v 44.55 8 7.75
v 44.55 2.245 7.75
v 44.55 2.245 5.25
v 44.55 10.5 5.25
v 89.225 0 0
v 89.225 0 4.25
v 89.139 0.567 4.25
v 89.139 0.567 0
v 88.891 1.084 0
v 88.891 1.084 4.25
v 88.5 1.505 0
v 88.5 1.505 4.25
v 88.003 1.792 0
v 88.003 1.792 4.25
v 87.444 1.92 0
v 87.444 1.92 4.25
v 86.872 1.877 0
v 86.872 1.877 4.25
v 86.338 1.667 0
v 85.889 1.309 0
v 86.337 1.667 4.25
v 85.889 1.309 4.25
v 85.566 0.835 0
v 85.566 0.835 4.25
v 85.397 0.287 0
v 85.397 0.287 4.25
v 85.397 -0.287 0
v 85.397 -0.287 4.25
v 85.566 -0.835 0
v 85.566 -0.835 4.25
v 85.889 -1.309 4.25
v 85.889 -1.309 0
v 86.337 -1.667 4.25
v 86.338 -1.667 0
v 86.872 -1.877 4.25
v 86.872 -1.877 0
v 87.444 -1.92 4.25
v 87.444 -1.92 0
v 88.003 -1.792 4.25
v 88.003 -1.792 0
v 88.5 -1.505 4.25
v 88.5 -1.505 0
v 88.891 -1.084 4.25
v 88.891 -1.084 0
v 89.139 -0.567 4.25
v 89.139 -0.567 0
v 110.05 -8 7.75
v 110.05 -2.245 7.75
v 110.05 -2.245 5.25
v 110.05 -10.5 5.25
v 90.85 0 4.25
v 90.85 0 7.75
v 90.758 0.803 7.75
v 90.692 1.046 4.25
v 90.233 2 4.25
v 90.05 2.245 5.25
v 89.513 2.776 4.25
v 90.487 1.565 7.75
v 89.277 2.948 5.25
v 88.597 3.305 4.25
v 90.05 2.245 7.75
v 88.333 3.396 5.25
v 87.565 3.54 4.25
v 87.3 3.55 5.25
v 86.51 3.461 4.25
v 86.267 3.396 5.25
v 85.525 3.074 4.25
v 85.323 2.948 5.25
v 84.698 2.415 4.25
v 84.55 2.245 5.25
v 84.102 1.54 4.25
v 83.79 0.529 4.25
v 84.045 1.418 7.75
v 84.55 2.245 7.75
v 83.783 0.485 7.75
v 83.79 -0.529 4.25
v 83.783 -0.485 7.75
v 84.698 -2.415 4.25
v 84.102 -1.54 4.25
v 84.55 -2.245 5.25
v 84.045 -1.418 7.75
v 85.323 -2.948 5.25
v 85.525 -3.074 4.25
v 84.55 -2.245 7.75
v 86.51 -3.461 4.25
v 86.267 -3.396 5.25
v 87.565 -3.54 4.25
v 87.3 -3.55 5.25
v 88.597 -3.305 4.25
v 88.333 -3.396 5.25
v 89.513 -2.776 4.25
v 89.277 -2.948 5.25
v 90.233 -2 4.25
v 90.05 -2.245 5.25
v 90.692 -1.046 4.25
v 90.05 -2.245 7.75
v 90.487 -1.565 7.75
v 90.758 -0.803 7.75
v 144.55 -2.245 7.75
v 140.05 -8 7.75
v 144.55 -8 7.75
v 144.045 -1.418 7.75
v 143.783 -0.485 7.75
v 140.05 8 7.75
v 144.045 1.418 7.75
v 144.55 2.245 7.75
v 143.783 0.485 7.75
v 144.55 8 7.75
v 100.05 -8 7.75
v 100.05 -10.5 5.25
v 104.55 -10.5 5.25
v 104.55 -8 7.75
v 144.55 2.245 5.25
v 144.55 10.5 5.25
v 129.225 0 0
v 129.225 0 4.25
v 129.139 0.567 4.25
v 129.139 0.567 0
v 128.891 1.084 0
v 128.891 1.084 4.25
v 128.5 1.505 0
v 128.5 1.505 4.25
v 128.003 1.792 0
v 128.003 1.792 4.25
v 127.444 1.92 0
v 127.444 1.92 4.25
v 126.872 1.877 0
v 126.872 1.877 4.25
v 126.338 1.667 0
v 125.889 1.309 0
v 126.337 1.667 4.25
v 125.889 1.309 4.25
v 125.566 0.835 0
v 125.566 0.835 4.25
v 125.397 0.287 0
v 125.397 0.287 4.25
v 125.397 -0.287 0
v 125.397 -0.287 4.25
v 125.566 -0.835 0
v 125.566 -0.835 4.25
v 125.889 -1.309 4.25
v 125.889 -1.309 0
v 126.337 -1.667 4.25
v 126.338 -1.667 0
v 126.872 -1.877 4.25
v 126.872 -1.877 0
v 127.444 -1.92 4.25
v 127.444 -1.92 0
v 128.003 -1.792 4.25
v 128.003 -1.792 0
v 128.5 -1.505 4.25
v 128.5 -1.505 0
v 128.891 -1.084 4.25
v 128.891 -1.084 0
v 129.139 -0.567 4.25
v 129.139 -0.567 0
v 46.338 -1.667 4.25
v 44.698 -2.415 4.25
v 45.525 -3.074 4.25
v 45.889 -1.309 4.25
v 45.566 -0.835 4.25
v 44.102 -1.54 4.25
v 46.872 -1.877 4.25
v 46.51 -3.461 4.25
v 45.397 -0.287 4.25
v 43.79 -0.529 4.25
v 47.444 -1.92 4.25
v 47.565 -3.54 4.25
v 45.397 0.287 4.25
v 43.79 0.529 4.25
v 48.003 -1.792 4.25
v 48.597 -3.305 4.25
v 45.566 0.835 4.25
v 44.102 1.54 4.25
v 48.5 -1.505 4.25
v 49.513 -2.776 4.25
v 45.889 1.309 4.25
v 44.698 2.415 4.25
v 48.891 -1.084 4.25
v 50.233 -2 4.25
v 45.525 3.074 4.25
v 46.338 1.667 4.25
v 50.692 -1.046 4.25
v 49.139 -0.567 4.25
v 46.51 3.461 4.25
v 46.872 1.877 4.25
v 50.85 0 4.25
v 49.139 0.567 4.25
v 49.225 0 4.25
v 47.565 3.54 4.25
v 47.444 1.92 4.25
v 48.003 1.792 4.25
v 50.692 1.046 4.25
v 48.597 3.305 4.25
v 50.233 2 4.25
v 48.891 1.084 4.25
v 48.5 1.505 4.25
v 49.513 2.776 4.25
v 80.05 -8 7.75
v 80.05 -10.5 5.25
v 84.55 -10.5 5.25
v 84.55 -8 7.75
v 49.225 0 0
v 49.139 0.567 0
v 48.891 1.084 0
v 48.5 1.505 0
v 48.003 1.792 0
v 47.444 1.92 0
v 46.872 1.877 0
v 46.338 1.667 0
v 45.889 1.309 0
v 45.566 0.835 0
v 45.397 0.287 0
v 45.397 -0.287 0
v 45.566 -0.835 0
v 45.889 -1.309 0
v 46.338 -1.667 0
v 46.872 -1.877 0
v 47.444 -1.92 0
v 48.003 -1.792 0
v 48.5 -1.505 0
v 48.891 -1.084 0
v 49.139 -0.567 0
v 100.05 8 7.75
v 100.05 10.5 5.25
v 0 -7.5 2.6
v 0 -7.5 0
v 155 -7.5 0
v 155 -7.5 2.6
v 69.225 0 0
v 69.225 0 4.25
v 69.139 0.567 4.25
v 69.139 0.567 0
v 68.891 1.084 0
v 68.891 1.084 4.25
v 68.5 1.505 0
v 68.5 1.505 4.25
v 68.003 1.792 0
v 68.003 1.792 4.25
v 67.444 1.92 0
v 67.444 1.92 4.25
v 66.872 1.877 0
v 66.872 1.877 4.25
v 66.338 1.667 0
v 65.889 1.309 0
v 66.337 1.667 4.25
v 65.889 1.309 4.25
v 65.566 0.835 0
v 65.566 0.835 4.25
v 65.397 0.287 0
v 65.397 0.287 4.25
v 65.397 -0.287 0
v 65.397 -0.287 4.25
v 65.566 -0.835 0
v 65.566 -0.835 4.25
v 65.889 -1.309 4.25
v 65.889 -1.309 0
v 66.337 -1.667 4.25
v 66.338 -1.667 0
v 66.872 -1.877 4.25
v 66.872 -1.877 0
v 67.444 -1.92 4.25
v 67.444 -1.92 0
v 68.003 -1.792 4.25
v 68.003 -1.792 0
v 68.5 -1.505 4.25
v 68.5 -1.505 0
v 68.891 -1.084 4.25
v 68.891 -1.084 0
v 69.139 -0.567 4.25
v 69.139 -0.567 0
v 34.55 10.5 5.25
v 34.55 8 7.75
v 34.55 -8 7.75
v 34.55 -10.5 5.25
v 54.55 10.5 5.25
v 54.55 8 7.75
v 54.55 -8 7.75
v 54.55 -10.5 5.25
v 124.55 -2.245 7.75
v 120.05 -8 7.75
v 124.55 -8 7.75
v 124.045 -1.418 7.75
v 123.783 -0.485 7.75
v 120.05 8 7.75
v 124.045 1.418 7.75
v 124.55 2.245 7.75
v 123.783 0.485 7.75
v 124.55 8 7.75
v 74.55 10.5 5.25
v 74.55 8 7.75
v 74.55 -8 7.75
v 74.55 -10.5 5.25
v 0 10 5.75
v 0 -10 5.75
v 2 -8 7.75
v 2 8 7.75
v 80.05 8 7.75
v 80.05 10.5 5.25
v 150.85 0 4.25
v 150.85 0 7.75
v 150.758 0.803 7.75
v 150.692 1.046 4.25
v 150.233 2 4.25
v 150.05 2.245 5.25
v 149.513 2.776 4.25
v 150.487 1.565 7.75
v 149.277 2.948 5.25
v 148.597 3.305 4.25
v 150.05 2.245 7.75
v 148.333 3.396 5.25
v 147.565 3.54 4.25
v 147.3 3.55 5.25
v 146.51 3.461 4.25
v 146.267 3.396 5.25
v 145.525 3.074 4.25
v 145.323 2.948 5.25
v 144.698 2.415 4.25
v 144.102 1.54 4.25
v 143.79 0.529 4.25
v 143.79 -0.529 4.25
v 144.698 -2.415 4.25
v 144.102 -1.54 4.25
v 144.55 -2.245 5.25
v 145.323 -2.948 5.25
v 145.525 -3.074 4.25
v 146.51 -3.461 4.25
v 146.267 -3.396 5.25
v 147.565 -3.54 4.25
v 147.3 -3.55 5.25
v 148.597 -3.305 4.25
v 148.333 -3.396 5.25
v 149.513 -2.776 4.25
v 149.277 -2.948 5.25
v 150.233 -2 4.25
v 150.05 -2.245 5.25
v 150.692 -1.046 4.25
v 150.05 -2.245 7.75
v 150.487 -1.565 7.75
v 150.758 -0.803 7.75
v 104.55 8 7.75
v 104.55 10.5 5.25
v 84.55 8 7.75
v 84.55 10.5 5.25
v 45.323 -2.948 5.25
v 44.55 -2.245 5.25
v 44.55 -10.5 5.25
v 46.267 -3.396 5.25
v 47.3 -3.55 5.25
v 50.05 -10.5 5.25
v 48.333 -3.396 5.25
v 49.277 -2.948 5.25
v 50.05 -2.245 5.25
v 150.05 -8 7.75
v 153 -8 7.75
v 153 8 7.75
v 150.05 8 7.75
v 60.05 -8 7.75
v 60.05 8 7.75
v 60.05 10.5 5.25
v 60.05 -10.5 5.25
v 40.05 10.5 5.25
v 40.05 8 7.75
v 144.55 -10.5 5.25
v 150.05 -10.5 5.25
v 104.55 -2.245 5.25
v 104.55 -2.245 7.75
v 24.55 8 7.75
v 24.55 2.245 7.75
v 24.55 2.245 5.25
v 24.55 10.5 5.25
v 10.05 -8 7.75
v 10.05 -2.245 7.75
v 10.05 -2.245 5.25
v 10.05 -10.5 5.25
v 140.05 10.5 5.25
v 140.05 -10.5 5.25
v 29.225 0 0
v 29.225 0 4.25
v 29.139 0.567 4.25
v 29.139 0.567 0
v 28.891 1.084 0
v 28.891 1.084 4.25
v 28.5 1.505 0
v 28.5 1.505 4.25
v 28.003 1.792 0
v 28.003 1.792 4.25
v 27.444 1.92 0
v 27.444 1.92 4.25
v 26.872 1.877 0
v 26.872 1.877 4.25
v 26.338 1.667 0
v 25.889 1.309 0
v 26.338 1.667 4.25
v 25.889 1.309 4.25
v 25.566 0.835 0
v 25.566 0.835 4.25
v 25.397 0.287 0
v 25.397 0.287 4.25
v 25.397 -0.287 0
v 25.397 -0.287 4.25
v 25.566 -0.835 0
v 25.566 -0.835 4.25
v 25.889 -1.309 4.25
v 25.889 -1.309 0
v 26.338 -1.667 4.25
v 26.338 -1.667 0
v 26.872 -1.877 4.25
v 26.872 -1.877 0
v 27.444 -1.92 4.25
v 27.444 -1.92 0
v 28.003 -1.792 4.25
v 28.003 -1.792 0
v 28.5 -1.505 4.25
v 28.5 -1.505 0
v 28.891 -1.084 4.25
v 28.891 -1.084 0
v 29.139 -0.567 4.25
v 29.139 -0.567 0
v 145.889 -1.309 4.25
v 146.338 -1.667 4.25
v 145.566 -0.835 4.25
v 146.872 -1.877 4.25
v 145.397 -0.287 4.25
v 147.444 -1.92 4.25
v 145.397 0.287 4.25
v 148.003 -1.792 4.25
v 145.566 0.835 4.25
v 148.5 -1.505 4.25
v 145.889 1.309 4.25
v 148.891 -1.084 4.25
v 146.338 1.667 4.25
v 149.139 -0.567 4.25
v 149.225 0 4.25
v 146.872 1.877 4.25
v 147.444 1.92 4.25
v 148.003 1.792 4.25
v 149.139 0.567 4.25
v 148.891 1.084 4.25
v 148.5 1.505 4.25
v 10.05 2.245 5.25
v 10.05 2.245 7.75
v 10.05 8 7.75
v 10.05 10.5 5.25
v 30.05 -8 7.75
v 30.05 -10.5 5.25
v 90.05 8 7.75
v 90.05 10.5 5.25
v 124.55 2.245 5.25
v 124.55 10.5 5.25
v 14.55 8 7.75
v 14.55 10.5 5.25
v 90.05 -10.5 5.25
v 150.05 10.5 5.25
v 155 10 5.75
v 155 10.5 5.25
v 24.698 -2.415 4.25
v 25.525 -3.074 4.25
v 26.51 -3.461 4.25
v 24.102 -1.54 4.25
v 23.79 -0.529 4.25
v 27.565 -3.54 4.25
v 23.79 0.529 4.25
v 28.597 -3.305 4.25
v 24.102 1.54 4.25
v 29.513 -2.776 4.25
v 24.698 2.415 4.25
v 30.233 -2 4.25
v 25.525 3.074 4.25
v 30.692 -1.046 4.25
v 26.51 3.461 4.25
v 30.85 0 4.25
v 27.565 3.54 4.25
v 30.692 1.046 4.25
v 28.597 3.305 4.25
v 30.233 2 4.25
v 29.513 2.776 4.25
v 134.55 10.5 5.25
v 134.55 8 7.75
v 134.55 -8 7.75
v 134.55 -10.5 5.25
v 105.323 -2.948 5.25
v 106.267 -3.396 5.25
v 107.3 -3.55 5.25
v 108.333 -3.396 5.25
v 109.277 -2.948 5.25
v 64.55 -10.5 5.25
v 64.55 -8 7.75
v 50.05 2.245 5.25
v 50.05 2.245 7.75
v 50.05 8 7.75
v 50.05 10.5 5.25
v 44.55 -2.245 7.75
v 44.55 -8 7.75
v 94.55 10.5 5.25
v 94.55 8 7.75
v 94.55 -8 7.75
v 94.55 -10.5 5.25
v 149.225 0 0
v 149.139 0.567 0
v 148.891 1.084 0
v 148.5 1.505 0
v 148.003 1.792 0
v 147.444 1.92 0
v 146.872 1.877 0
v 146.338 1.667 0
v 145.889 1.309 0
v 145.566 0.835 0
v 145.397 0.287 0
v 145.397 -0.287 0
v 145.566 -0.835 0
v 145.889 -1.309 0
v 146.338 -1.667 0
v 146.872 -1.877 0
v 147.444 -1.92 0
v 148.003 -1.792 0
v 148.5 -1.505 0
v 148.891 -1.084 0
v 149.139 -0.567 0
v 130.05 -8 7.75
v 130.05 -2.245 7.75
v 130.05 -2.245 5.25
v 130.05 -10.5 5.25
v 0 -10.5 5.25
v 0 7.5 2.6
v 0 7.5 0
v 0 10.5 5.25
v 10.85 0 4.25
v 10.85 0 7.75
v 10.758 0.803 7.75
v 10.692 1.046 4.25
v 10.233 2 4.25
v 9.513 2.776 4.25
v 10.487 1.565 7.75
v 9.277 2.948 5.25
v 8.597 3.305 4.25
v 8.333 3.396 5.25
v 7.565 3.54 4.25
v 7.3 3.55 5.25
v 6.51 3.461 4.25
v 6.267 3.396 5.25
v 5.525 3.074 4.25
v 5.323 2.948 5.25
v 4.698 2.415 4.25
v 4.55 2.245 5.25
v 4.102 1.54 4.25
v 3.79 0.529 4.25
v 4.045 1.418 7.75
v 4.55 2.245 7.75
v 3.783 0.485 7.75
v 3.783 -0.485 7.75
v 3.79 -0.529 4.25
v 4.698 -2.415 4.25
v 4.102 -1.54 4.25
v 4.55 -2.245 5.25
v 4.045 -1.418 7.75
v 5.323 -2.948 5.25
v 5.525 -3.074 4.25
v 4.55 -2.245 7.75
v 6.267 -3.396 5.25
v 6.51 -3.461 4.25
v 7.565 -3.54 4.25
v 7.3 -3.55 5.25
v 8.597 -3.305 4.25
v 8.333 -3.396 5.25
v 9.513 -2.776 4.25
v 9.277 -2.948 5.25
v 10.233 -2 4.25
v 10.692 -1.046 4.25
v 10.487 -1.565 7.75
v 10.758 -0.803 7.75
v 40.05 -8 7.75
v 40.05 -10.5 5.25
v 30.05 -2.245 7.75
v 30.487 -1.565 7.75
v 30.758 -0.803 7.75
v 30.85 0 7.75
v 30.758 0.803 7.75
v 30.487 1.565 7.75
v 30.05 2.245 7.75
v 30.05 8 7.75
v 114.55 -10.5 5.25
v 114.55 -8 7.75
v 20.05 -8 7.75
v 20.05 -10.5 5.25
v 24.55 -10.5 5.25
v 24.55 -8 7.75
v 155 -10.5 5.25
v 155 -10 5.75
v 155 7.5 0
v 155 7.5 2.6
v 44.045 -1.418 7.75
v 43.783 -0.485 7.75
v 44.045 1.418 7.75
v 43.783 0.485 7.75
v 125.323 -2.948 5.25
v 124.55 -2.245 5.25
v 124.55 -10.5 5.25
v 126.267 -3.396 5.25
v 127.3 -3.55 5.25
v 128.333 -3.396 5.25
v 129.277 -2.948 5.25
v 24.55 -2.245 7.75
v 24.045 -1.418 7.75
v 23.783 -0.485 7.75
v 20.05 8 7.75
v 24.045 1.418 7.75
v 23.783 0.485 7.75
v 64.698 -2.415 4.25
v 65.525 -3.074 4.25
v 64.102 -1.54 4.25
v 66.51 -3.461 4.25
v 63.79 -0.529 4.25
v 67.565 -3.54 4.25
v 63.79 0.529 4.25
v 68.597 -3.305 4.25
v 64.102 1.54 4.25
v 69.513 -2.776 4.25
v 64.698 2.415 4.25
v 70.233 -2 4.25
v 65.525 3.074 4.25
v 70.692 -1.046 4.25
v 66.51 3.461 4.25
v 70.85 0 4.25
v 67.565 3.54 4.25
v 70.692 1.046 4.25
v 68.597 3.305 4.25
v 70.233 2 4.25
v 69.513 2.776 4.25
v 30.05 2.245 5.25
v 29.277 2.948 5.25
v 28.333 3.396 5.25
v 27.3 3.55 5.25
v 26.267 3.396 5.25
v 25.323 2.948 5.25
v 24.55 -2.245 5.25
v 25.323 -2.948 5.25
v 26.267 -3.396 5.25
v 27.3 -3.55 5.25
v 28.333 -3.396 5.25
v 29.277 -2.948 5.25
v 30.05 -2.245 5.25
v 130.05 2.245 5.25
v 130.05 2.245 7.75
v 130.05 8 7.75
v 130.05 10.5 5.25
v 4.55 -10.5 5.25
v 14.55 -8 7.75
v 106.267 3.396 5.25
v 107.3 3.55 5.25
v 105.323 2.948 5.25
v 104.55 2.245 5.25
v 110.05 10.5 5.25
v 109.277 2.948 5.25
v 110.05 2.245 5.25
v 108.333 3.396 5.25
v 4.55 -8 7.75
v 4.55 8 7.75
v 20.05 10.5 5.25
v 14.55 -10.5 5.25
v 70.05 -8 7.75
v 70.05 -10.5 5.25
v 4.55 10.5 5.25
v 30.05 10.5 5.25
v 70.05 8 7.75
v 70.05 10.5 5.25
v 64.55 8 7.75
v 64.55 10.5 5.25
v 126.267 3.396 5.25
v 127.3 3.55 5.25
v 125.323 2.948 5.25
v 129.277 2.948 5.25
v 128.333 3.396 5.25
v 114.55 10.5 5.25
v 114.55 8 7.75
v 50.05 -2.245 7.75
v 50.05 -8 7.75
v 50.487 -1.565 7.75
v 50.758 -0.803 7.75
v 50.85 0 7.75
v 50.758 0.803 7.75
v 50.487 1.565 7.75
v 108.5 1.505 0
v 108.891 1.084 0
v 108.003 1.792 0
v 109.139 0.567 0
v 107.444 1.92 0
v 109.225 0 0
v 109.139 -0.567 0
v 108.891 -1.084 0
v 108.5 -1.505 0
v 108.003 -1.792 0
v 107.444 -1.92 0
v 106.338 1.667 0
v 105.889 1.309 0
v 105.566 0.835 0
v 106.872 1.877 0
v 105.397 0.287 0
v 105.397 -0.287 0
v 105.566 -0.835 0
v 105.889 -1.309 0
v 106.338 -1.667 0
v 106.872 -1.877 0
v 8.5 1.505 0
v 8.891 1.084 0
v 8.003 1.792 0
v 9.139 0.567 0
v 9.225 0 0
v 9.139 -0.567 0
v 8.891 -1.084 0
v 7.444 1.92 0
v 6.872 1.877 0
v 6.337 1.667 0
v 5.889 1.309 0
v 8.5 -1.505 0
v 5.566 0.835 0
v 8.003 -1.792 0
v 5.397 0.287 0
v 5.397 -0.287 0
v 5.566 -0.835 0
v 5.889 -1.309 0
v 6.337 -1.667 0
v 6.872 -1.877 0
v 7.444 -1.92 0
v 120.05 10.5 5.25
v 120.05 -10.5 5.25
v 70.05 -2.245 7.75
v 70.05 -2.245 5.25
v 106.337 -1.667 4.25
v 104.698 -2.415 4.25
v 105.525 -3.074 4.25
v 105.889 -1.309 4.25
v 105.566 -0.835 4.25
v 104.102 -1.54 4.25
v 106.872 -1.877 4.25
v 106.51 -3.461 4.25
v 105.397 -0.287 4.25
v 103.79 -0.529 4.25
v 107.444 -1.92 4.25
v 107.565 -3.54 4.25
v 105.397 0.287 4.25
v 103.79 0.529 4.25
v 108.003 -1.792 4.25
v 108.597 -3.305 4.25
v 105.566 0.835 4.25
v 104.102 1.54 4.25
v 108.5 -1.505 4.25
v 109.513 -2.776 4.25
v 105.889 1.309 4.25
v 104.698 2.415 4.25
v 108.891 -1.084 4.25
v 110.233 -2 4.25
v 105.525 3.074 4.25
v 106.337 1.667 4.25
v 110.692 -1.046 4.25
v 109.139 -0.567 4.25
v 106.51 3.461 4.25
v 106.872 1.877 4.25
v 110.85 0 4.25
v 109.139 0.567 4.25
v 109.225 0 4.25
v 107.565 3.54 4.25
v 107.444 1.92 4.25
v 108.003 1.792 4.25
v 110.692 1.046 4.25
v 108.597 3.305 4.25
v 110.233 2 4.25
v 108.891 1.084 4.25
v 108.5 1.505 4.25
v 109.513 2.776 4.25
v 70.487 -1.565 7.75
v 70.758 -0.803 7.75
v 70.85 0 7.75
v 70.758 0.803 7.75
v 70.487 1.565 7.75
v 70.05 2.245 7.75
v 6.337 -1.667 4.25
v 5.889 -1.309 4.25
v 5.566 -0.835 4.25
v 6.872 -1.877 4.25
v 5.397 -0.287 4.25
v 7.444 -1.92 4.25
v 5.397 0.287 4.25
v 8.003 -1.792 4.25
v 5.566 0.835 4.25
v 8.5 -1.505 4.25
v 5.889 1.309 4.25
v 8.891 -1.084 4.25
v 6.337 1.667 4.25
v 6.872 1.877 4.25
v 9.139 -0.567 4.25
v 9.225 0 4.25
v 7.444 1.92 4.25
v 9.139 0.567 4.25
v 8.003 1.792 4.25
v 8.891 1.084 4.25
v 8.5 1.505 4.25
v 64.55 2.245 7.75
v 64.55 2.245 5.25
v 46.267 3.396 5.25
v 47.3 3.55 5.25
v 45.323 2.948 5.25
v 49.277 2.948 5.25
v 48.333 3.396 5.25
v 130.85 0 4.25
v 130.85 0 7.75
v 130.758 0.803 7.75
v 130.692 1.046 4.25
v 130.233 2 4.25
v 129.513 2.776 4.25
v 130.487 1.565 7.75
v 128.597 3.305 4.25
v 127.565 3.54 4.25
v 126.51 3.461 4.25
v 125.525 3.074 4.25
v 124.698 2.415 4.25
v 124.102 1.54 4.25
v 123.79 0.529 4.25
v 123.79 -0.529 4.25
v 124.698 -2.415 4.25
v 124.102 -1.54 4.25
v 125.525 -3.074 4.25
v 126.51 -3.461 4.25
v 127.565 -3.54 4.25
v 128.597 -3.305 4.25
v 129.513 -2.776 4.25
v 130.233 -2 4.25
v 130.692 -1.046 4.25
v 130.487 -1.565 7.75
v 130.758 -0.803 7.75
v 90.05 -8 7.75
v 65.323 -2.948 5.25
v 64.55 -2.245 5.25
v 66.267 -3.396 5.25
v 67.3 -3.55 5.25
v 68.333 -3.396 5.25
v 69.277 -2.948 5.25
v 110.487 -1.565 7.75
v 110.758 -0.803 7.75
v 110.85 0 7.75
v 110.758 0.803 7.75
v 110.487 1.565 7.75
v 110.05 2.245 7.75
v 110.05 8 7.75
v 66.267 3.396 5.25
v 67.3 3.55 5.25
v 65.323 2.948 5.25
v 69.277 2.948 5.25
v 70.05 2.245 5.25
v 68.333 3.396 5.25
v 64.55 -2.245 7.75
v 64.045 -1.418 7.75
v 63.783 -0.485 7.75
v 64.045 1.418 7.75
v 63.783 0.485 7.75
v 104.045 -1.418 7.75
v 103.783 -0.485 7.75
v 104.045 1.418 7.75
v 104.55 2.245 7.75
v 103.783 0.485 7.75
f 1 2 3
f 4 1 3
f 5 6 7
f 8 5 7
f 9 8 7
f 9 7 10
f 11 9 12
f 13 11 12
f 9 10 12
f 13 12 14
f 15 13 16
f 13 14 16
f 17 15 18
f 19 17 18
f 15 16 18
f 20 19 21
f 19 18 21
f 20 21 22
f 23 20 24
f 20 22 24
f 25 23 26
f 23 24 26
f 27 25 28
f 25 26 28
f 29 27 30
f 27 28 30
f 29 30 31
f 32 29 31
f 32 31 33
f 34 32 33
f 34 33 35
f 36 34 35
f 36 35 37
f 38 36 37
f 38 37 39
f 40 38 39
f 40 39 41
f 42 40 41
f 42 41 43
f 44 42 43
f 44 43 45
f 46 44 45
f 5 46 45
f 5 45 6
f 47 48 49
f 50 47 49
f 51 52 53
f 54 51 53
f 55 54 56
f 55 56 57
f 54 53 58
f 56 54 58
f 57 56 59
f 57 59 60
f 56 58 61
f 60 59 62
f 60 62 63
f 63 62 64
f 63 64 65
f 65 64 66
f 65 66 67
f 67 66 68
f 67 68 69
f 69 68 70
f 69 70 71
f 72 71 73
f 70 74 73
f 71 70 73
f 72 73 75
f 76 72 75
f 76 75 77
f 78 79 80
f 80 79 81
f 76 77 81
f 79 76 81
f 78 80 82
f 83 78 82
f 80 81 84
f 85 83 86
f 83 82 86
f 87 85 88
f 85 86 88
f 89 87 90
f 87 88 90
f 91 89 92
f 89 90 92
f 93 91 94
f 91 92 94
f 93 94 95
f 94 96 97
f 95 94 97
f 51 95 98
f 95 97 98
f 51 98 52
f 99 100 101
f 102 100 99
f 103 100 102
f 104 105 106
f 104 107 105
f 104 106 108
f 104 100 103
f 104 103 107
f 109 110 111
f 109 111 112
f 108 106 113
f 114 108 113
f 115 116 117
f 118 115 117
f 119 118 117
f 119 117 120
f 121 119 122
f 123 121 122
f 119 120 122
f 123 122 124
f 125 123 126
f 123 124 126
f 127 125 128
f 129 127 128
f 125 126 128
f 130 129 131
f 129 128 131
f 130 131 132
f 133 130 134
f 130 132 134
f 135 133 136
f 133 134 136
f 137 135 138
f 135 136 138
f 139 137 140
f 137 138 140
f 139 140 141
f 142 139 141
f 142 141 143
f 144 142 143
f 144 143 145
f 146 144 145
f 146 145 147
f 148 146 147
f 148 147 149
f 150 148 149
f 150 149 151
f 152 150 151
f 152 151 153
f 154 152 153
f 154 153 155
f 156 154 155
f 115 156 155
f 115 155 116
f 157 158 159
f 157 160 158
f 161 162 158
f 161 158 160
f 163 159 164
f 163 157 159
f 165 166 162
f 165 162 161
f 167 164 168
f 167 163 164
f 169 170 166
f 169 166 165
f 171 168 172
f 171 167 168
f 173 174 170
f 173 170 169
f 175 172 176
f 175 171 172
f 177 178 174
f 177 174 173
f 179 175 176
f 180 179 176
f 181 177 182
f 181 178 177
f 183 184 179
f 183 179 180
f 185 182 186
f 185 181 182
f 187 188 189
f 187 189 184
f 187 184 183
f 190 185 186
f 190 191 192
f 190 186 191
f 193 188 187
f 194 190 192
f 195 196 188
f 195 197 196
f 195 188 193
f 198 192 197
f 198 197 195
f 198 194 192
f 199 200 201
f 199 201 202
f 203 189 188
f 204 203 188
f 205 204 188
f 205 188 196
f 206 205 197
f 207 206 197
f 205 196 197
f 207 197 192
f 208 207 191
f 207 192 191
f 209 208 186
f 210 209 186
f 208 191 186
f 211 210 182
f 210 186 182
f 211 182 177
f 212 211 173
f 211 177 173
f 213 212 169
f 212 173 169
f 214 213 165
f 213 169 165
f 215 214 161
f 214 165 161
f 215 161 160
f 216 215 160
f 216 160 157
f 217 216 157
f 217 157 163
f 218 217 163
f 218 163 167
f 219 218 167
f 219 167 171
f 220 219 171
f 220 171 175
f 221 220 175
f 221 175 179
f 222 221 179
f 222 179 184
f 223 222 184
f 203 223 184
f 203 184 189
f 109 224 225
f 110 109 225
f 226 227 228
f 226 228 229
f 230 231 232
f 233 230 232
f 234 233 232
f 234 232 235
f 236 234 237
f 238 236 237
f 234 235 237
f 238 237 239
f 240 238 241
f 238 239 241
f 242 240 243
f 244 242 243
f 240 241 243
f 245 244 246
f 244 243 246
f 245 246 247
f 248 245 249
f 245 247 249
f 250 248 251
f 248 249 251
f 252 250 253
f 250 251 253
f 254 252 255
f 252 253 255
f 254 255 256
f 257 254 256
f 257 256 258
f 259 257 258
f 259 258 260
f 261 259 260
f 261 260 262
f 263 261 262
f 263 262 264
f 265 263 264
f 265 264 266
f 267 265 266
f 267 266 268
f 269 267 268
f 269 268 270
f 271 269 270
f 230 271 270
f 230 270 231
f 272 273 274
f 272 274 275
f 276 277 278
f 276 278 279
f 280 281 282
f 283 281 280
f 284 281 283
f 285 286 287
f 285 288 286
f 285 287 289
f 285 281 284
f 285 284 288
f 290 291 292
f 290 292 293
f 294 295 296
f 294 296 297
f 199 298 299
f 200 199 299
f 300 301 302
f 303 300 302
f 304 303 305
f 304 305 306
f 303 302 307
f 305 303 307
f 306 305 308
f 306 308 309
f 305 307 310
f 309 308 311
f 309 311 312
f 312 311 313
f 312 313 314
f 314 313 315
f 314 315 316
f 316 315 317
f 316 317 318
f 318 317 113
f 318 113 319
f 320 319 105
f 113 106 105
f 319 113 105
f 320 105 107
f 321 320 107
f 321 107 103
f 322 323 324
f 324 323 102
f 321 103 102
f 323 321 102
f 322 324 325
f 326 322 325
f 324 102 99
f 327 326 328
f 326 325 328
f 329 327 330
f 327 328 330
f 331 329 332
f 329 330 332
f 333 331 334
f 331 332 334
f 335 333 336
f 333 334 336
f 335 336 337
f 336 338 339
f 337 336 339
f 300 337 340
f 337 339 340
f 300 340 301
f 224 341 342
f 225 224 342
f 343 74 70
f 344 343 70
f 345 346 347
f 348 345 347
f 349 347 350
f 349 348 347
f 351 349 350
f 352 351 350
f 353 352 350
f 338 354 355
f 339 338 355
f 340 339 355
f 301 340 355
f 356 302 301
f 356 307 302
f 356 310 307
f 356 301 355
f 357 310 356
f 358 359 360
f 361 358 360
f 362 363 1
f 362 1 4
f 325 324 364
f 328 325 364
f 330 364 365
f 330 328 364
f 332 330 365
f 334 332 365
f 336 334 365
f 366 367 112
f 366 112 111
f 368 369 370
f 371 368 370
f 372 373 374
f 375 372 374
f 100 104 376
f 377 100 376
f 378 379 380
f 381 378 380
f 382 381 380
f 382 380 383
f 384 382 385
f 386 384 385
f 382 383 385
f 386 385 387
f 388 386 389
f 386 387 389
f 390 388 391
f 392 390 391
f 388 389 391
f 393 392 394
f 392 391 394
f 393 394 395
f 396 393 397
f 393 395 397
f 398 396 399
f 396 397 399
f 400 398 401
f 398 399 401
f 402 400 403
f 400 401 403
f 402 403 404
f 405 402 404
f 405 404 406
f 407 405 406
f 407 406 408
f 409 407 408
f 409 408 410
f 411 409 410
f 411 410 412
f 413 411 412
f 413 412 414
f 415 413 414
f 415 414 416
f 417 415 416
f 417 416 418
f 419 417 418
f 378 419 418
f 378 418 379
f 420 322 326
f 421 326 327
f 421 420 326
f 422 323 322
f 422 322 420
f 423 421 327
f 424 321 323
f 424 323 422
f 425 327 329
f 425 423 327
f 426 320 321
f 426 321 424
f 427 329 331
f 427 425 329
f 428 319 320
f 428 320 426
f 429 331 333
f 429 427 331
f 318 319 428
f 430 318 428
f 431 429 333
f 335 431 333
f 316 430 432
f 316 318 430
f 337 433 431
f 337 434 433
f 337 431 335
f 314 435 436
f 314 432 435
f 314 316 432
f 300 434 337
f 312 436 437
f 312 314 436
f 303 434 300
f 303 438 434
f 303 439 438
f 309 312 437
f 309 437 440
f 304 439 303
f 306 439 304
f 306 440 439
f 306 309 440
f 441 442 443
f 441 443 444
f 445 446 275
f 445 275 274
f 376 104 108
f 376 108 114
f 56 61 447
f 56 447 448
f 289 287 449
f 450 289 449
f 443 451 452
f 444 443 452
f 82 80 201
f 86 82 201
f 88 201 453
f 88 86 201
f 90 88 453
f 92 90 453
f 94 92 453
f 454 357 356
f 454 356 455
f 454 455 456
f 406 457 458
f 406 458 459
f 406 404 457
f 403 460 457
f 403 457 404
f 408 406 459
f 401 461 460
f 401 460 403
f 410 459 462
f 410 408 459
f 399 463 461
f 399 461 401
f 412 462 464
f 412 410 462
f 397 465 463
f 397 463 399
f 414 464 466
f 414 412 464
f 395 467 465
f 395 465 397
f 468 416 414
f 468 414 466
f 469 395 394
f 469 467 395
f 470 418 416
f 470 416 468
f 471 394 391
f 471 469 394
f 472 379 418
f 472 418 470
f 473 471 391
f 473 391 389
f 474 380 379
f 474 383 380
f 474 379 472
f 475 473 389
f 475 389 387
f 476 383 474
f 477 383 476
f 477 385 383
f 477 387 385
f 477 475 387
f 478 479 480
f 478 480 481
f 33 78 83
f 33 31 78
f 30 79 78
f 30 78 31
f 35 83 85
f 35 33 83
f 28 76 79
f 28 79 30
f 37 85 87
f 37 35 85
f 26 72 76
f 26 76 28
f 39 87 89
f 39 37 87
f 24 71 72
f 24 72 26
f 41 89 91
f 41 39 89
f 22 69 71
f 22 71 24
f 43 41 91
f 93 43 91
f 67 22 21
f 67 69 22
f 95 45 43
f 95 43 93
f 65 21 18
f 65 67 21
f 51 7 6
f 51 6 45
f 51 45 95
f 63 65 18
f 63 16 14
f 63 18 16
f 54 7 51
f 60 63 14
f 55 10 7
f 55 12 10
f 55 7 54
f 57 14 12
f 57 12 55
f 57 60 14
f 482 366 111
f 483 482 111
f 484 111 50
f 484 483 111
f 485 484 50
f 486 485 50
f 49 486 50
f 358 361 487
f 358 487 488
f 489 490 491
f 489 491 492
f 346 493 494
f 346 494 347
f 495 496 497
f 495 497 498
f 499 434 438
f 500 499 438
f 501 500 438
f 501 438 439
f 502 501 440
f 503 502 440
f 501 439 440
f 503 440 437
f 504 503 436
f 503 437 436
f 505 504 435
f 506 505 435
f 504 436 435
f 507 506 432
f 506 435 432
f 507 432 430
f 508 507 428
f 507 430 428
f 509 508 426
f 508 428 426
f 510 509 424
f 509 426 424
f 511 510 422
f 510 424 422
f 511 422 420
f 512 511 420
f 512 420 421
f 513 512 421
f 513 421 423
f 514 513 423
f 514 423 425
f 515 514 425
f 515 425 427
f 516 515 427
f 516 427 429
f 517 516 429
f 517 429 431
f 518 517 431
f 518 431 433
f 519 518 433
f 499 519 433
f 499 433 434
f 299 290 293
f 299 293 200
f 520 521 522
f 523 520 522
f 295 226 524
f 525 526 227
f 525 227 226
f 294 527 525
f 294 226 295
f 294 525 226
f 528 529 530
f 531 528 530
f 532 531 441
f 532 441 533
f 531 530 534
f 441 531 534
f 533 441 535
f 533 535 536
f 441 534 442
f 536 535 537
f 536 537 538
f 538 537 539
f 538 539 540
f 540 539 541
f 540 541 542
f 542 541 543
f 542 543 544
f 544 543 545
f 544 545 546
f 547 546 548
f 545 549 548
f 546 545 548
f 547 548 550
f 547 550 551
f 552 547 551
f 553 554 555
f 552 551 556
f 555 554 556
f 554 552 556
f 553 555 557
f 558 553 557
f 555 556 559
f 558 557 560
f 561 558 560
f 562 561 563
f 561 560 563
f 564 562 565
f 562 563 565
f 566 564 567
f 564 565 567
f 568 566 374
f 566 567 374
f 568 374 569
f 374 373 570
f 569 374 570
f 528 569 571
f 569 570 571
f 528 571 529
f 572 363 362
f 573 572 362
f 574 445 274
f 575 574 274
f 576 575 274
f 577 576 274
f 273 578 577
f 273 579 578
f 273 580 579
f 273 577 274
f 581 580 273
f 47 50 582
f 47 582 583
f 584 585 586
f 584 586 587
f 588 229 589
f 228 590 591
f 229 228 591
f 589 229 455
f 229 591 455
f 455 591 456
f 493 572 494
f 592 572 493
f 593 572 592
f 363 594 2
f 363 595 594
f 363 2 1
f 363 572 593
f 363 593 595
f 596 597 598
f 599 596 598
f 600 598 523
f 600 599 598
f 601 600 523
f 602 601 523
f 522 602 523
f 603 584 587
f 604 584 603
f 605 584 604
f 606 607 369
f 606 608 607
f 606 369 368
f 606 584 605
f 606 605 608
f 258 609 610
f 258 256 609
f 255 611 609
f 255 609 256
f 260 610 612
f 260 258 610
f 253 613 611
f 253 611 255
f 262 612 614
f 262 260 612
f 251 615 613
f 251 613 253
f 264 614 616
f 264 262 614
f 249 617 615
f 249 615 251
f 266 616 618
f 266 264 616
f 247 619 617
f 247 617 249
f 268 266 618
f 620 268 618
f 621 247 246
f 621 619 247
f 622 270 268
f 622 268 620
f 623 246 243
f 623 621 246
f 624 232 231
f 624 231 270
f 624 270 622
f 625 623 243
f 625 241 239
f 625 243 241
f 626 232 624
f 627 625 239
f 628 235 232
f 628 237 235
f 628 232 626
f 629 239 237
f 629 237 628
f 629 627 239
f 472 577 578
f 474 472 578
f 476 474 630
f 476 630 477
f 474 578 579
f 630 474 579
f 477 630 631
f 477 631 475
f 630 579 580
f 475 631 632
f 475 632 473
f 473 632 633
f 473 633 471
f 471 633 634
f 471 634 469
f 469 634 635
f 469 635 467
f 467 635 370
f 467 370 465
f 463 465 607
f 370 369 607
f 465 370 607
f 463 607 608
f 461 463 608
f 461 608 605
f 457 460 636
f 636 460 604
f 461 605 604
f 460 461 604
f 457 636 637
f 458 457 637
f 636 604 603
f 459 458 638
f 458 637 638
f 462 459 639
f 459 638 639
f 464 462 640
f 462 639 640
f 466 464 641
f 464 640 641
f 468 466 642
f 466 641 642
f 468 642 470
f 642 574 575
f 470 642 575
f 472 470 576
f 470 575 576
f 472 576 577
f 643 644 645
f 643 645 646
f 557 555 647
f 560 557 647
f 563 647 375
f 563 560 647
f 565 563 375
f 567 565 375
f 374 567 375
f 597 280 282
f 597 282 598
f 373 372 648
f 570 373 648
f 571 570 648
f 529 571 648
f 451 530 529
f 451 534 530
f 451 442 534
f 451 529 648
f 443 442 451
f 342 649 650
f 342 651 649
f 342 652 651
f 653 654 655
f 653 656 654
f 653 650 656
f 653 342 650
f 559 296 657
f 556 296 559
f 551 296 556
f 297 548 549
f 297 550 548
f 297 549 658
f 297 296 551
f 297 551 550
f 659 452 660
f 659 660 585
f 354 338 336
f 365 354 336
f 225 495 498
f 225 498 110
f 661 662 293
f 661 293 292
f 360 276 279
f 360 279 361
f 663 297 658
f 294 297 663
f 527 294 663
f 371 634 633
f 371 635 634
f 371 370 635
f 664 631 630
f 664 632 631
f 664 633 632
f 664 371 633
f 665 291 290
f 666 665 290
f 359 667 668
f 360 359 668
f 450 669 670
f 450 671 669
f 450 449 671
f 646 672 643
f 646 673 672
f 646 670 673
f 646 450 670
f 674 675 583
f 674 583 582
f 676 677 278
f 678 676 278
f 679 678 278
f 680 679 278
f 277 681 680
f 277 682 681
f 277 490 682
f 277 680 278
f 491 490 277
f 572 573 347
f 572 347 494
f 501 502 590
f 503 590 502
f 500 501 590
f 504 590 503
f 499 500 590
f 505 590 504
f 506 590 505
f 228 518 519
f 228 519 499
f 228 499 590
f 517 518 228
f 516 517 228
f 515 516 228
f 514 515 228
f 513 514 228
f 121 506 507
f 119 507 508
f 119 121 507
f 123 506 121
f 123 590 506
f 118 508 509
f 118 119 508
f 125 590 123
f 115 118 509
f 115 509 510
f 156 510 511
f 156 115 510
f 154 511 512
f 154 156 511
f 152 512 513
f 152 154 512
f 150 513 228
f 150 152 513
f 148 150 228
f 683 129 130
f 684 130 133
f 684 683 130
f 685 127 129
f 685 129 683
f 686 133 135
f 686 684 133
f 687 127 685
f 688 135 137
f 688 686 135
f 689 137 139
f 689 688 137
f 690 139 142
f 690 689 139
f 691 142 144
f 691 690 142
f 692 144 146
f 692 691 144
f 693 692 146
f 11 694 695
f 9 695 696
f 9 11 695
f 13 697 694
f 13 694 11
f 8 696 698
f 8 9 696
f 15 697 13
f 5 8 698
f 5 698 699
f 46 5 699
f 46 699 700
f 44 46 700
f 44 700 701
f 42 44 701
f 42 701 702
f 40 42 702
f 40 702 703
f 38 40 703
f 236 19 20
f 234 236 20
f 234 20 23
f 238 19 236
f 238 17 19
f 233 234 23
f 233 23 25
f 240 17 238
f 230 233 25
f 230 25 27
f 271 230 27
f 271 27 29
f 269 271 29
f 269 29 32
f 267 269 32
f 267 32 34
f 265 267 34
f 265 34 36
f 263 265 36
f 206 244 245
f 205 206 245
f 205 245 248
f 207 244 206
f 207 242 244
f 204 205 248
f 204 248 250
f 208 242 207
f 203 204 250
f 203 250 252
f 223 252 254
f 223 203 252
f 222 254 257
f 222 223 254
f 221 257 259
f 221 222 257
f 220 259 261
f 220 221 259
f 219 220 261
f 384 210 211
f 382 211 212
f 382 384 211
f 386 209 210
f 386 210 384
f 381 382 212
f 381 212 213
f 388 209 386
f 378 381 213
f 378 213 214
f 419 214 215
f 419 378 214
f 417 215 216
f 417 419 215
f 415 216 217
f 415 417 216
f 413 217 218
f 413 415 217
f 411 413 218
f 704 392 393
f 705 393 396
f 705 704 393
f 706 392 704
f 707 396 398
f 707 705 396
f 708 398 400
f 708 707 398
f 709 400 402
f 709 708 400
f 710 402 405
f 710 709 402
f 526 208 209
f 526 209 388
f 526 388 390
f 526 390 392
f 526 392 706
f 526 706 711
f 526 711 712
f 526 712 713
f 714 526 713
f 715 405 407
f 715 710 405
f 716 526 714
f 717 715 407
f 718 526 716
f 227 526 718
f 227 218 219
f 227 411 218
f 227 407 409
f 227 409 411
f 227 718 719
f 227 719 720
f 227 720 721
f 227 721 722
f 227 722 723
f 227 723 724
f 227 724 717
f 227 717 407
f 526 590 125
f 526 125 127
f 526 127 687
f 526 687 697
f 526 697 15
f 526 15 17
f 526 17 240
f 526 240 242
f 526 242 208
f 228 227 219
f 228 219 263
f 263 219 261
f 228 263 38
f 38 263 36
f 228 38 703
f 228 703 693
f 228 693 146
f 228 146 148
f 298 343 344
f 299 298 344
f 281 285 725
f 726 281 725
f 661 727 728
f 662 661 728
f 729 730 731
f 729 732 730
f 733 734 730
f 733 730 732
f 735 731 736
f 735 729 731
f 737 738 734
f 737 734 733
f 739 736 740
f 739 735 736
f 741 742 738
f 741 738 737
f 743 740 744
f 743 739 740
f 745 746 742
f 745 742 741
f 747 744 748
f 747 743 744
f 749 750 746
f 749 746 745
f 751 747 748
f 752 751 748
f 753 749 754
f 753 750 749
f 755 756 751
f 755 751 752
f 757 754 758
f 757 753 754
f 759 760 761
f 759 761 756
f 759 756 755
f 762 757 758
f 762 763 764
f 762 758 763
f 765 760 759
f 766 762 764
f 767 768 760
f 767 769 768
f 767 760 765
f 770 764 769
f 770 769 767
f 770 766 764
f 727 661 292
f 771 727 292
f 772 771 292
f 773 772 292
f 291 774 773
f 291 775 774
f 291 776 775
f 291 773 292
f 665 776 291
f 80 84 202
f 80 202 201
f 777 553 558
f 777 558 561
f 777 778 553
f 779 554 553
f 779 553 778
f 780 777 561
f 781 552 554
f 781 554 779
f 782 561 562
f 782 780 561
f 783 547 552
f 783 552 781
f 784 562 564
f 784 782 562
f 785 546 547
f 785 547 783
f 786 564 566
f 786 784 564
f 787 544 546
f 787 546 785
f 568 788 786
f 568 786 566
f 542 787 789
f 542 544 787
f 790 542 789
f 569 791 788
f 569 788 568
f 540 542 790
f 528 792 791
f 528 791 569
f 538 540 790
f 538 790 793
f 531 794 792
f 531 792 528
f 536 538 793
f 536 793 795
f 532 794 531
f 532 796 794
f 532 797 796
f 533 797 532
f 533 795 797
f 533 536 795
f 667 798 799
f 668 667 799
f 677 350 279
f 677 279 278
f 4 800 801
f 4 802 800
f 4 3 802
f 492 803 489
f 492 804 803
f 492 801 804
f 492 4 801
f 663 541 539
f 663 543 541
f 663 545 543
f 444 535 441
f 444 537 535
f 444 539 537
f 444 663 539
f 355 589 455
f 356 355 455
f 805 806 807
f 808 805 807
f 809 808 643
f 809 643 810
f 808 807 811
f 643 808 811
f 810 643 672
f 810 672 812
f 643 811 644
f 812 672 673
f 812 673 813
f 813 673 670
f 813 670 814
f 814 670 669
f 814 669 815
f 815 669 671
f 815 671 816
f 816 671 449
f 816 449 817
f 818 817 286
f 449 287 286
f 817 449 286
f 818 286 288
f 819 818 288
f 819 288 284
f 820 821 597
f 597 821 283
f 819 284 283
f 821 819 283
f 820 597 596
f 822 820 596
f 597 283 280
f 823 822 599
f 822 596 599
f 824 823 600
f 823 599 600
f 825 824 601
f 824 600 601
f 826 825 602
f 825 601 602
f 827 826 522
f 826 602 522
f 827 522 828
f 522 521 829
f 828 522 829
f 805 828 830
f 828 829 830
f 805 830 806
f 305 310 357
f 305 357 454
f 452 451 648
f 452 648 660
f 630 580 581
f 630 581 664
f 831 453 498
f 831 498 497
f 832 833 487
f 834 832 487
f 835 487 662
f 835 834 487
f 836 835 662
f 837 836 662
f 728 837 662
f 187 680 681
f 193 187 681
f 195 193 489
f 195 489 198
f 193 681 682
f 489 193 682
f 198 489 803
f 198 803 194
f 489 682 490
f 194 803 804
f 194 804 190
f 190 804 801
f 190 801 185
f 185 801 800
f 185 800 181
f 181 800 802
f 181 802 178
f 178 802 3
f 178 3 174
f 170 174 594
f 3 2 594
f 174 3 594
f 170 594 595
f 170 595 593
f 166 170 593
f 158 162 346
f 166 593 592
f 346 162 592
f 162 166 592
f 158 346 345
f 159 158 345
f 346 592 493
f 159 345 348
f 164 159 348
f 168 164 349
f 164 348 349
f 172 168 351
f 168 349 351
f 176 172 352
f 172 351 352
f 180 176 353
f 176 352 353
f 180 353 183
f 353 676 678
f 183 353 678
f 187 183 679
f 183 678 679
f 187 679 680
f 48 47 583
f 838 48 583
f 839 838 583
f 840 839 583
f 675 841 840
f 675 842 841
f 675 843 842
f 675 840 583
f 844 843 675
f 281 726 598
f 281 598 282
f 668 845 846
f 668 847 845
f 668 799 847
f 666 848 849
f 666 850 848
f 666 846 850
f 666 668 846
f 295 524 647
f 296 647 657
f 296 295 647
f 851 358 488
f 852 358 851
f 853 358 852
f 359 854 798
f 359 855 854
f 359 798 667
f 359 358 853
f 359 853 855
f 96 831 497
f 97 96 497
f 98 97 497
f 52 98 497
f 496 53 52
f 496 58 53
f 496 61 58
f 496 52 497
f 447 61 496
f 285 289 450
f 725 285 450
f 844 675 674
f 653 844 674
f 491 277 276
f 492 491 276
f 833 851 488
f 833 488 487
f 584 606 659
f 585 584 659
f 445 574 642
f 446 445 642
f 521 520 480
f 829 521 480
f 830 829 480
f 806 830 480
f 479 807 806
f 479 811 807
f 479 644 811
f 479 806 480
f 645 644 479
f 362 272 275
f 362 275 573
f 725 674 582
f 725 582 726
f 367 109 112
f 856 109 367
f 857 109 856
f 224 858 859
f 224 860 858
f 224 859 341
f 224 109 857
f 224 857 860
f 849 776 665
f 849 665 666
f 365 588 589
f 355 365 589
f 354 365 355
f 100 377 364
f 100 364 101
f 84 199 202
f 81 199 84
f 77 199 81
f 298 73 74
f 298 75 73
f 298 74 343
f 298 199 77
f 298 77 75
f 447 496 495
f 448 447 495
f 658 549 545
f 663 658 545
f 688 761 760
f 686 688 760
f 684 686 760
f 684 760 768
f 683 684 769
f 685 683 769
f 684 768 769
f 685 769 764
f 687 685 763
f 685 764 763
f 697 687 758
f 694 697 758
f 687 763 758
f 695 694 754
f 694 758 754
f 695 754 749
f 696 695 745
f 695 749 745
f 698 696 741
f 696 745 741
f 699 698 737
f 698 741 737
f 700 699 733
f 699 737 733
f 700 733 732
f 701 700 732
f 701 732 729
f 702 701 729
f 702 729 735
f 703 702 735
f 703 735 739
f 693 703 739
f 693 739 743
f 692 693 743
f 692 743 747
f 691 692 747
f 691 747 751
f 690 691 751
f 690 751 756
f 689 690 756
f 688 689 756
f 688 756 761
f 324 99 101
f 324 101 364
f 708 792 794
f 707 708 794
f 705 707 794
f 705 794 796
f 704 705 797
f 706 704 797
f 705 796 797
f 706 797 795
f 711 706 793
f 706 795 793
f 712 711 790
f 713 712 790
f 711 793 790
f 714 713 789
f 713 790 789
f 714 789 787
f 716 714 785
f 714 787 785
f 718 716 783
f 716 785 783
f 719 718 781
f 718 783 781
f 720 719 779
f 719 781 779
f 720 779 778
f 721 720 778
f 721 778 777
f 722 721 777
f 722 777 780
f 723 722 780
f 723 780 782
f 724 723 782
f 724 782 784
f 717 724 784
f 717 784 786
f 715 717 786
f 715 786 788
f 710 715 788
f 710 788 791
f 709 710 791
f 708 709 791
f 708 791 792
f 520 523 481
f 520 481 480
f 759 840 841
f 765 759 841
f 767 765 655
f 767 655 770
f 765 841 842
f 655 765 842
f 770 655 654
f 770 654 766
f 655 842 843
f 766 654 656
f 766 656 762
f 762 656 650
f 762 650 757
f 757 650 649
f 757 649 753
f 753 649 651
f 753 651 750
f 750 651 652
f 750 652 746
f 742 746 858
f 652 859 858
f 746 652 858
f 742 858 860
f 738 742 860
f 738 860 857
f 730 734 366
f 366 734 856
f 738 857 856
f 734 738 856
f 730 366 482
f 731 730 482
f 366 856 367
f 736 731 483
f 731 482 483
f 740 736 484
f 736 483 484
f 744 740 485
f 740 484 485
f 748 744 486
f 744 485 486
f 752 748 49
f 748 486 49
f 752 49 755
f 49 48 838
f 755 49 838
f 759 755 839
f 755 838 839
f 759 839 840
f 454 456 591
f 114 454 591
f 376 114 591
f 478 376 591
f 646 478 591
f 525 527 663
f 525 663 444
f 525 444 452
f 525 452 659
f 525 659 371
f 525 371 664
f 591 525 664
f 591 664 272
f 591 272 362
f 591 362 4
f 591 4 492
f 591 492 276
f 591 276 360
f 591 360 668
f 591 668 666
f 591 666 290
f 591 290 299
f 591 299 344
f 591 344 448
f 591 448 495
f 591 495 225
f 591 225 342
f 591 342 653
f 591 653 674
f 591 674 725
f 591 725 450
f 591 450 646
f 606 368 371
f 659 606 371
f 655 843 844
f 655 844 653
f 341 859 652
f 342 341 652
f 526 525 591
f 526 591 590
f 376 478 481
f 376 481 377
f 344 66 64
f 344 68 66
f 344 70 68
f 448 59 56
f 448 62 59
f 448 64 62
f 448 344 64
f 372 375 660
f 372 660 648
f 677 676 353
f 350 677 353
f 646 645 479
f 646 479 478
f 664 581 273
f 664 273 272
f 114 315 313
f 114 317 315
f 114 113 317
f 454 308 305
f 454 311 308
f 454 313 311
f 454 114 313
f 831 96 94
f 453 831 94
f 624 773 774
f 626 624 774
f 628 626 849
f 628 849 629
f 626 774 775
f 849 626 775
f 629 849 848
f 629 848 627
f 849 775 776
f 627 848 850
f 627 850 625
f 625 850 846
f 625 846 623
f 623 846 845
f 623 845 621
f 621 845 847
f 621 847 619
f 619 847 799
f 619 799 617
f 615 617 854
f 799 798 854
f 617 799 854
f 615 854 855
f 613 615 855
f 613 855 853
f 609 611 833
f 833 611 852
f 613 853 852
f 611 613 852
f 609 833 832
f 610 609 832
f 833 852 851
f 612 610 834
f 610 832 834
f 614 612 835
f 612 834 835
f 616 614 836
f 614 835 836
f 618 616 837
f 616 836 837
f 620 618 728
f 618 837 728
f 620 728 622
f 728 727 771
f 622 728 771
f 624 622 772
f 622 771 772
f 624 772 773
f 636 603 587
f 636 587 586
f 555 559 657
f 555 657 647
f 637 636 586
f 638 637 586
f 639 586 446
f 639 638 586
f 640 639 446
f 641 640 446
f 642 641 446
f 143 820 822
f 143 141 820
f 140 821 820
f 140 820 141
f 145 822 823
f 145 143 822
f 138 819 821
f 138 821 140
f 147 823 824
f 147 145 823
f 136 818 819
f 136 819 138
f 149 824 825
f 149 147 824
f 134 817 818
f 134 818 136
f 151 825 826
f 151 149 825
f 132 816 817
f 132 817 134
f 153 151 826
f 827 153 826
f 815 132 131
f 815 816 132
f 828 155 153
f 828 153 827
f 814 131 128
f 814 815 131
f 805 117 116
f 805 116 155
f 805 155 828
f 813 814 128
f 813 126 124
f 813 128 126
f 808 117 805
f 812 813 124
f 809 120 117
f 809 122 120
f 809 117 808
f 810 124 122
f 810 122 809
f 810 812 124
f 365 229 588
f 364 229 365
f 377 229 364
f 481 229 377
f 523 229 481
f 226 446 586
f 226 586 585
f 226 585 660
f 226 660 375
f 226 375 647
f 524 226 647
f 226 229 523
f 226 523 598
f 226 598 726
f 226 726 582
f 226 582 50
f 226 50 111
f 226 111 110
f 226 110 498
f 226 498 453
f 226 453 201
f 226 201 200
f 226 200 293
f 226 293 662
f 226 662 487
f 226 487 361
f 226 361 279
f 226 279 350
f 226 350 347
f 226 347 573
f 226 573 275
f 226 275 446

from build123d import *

# Parameters (mm, degrees)
EXTRUDE_2_DEPTH        = 155
CHAMFER_1_SIZE         = 2
SKETCH_5_W             = 5.5
SKETCH_5_H             = 2.5
CUT_EXTRUDE_1_DEPTH    = 156.548424936
CUT_EXTRUDE_2_REACH    = 157.444
SKETCH_6_R             = 1.925
SKETCH_7_R             = 3.55
CUT_EXTRUDE_3_DEPTH    = 3.5
PATTERN_LINEAR_1_COUNT = 15
PATTERN_LINEAR_1_PITCH = 10
PATTERN_LINEAR_2_COUNT = 8
PATTERN_LINEAR_2_PITCH = 20


with BuildPart() as part:
    # 스케치4 → 보스-돌출2 (new body)
    with BuildSketch(Plane(origin=(0, 0, 0), x_dir=(0, 0, -1), z_dir=(1, 0, 0))):
        Polygon((0, 7.5), (0, -7.5), (-2.6, -7.5), (-5.25, -10.5), (-7.75, -8), (-7.75, 8), (-5.25, 10.5), (-2.6, 7.5), align=None)
    extrude(amount=EXTRUDE_2_DEPTH)

    # 모따기1
    chamfer_1_edges = [part.edges().sort_by_distance(p)[0] for p in [
        (0, 0, 7.75),
        (155, 0, 7.75),
    ]]
    chamfer(chamfer_1_edges, length=CHAMFER_1_SIZE)

    # 스케치5 → 컷-돌출1 (cut, symmetric)
    with BuildSketch(Plane(origin=(0, 0, 0), x_dir=(1, 0, 0), z_dir=(0, 1, 0))):
        with Locations((7.3, -6.5)):
            Rectangle(SKETCH_5_W, SKETCH_5_H)
    cut_extrude_1 = extrude(amount=CUT_EXTRUDE_1_DEPTH, both=True, mode=Mode.SUBTRACT)

    # 스케치6 → 컷-돌출2 (cut, up to next)
    with BuildSketch(Plane.XY.offset(5.25), mode=Mode.PRIVATE) as cut_extrude_2_sk1:
        with Locations((7.3, 0)):
            Circle(SKETCH_6_R)
    cut_extrude_2_tool1 = extrude(cut_extrude_2_sk1.sketch, amount=-CUT_EXTRUDE_2_REACH, mode=Mode.PRIVATE) & part.part
    cut_extrude_2 = cut_extrude_2_tool1.solids().sort_by_distance((7.3, 0, 5.25))[0]
    add(cut_extrude_2, mode=Mode.SUBTRACT)

    # 스케치7 → 컷-돌출3 (cut)
    with BuildSketch(Plane.XY.offset(7.75)):
        with Locations((7.3, 0)):
            Circle(SKETCH_7_R)
    cut_extrude_3 = extrude(amount=-CUT_EXTRUDE_3_DEPTH, mode=Mode.SUBTRACT)

    # 선형 패턴1: 컷-돌출1 ×15
    with Locations(*[(i * PATTERN_LINEAR_1_PITCH, 0, 0) for i in range(1, PATTERN_LINEAR_1_COUNT)]):
        add(cut_extrude_1, mode=Mode.SUBTRACT)

    # 선형 패턴2: 컷-돌출2, 컷-돌출3 ×8
    with Locations(*[(i * PATTERN_LINEAR_2_PITCH, 0, 0) for i in range(1, PATTERN_LINEAR_2_COUNT)]):
        add(cut_extrude_2, mode=Mode.SUBTRACT)
        add(cut_extrude_3, mode=Mode.SUBTRACT)


solid = part.part
